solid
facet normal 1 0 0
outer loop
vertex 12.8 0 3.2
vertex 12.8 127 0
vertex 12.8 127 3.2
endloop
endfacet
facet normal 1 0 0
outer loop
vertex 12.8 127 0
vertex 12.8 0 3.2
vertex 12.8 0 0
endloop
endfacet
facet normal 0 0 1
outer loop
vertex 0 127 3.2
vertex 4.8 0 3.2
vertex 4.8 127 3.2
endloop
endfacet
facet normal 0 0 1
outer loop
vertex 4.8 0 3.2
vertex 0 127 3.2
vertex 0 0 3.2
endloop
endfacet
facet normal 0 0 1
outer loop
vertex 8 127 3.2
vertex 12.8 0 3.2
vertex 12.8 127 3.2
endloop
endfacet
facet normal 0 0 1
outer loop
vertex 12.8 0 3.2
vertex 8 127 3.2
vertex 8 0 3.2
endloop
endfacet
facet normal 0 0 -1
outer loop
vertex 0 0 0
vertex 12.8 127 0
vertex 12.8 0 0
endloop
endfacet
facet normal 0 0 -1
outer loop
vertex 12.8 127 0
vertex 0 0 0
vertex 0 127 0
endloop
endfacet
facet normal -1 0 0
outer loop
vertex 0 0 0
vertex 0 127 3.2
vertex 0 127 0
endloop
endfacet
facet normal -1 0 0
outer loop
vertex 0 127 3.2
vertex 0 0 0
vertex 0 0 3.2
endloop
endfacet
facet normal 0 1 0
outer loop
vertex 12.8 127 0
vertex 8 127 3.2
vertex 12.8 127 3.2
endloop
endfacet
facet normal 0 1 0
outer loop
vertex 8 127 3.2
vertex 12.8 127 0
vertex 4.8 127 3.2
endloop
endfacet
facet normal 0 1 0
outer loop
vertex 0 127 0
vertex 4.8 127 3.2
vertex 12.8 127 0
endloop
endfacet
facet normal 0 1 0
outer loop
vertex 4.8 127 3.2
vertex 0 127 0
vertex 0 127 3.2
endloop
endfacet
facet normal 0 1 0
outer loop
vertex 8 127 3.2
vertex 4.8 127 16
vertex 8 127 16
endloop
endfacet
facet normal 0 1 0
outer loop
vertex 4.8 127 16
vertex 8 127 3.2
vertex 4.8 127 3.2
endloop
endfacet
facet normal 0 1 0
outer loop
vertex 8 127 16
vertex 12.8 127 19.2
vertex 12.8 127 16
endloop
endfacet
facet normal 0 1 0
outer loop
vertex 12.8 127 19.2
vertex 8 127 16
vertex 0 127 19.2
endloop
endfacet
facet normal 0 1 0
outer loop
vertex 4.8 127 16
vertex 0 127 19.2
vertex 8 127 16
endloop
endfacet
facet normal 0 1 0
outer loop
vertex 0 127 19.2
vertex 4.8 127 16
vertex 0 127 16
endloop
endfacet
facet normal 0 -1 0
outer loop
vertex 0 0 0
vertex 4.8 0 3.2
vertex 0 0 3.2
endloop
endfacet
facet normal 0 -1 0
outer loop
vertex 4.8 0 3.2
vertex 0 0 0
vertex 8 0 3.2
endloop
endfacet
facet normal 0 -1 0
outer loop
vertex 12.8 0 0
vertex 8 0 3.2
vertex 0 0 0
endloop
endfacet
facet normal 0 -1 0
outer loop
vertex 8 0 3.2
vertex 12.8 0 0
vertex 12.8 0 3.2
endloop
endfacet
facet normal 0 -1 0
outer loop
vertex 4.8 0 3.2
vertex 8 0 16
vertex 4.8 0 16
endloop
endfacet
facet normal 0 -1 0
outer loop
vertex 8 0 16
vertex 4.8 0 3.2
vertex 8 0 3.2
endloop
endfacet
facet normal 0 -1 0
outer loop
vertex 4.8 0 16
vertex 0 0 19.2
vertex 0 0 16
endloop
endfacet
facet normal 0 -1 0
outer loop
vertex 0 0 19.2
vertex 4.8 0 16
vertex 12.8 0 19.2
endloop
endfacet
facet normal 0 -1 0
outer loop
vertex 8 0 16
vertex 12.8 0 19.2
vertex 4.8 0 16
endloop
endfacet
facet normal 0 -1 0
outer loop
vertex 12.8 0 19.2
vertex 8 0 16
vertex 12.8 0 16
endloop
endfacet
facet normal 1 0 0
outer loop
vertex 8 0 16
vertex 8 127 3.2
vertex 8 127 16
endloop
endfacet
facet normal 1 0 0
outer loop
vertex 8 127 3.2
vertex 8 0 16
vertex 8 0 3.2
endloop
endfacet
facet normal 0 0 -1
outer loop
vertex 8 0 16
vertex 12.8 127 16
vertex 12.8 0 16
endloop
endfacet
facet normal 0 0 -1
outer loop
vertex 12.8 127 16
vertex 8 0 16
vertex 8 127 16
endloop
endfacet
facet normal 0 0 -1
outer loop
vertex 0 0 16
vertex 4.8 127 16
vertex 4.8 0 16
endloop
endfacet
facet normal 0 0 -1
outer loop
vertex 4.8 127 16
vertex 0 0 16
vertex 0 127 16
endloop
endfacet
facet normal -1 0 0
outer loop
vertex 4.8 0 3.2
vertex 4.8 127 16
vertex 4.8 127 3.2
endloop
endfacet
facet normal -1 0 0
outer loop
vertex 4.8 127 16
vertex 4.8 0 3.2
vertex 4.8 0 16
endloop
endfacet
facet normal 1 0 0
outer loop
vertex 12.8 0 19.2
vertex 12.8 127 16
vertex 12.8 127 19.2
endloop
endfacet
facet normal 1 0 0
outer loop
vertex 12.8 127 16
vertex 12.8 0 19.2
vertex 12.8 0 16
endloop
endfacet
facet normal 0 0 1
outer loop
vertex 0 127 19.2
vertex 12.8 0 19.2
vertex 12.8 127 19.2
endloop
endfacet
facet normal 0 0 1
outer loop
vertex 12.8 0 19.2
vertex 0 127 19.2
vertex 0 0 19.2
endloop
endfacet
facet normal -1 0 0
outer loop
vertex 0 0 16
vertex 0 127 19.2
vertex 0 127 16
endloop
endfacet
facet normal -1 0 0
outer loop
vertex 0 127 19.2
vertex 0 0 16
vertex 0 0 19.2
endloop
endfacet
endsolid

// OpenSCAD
b_1 = 12.8;
b_2 = 12.8;
t_1 = 3.2;
t_2 = 3.2;
L = 127;


cube(size=[b_1,L,t_1]);
translate(v=[(b_1-t_2)/2,0,t_1])cube(size=[t_2,L,b_2]);
translate(v=[0,0,t_1+b_2])cube(size=[b_1,L,t_1]);
